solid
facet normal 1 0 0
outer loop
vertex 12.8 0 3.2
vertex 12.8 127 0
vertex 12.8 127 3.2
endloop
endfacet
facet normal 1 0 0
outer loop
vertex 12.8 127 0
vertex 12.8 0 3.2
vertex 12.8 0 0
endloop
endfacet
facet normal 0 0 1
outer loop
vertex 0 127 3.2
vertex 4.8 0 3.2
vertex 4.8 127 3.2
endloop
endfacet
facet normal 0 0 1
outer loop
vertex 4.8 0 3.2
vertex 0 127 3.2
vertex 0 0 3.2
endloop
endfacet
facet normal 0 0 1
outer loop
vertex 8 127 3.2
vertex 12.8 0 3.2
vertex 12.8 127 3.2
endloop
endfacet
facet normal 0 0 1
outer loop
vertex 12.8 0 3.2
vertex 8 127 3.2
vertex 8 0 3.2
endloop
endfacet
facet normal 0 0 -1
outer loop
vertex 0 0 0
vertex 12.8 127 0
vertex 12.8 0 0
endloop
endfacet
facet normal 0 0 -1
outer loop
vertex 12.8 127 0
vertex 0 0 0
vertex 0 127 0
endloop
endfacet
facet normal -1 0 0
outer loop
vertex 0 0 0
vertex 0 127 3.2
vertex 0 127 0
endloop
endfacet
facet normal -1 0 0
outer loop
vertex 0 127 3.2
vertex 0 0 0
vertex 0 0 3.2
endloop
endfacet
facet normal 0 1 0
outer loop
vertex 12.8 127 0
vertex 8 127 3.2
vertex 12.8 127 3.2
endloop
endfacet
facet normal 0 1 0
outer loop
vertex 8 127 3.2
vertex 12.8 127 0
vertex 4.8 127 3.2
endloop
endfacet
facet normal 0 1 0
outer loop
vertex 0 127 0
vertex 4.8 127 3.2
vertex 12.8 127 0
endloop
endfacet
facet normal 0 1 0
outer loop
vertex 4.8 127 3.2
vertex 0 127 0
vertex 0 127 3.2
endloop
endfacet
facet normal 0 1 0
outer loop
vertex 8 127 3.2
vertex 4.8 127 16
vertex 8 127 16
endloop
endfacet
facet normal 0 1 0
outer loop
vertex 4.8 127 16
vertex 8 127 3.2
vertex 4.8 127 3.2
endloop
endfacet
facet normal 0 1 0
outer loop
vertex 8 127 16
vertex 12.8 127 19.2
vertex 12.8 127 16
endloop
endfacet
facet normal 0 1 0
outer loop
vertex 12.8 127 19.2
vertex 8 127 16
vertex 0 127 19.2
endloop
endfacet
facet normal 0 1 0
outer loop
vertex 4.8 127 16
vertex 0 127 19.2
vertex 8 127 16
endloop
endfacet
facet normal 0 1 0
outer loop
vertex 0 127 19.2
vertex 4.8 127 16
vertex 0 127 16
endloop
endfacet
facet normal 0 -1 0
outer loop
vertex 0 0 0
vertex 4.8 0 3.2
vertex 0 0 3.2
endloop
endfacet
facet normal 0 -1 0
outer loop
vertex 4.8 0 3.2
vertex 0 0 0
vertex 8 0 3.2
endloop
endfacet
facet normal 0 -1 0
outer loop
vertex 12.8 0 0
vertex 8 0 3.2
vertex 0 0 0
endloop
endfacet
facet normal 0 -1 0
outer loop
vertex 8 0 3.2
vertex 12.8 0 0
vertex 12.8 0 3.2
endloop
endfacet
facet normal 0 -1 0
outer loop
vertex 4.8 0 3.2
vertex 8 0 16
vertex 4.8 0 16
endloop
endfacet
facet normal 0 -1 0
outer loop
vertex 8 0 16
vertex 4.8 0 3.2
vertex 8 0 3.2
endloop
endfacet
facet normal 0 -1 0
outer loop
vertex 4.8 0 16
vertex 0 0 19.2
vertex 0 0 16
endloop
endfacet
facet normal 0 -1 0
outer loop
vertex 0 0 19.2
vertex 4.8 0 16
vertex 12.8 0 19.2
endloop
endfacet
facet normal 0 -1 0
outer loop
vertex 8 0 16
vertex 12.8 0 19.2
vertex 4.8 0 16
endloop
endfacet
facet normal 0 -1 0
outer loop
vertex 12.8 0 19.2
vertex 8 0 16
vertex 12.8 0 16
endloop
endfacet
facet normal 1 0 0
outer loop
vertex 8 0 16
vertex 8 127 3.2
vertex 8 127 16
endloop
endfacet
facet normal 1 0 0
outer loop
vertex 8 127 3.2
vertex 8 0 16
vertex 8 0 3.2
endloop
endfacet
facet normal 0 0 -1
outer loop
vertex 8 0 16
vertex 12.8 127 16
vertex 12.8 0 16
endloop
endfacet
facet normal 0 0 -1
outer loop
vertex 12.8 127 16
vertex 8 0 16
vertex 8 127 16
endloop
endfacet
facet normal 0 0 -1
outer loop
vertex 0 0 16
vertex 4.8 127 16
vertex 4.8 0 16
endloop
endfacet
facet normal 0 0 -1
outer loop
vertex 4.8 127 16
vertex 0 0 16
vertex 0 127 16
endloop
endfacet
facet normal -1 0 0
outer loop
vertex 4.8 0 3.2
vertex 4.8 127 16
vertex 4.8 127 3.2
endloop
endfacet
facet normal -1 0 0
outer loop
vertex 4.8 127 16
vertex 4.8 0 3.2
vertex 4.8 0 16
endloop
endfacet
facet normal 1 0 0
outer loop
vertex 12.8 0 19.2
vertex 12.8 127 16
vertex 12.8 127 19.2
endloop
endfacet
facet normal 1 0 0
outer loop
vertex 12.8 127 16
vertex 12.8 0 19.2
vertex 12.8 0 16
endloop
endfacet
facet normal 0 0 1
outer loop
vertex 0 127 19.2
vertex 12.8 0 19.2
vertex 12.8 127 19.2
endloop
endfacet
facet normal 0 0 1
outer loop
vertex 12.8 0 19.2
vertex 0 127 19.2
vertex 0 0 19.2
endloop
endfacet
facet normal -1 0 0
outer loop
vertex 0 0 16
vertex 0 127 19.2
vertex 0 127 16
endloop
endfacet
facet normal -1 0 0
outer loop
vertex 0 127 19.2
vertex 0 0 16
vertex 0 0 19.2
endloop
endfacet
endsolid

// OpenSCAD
b_1 = 12.8;
b_2 = 12.8;
t_1 = 3.2;
t_2 = 3.2;
L = 127;


cube(size=[b_1,L,t_1]);
translate(v=[(b_1-t_2)/2,0,t_1])cube(size=[t_2,L,b_2]);
translate(v=[0,0,t_1+b_2])cube(size=[b_1,L,t_1]);
